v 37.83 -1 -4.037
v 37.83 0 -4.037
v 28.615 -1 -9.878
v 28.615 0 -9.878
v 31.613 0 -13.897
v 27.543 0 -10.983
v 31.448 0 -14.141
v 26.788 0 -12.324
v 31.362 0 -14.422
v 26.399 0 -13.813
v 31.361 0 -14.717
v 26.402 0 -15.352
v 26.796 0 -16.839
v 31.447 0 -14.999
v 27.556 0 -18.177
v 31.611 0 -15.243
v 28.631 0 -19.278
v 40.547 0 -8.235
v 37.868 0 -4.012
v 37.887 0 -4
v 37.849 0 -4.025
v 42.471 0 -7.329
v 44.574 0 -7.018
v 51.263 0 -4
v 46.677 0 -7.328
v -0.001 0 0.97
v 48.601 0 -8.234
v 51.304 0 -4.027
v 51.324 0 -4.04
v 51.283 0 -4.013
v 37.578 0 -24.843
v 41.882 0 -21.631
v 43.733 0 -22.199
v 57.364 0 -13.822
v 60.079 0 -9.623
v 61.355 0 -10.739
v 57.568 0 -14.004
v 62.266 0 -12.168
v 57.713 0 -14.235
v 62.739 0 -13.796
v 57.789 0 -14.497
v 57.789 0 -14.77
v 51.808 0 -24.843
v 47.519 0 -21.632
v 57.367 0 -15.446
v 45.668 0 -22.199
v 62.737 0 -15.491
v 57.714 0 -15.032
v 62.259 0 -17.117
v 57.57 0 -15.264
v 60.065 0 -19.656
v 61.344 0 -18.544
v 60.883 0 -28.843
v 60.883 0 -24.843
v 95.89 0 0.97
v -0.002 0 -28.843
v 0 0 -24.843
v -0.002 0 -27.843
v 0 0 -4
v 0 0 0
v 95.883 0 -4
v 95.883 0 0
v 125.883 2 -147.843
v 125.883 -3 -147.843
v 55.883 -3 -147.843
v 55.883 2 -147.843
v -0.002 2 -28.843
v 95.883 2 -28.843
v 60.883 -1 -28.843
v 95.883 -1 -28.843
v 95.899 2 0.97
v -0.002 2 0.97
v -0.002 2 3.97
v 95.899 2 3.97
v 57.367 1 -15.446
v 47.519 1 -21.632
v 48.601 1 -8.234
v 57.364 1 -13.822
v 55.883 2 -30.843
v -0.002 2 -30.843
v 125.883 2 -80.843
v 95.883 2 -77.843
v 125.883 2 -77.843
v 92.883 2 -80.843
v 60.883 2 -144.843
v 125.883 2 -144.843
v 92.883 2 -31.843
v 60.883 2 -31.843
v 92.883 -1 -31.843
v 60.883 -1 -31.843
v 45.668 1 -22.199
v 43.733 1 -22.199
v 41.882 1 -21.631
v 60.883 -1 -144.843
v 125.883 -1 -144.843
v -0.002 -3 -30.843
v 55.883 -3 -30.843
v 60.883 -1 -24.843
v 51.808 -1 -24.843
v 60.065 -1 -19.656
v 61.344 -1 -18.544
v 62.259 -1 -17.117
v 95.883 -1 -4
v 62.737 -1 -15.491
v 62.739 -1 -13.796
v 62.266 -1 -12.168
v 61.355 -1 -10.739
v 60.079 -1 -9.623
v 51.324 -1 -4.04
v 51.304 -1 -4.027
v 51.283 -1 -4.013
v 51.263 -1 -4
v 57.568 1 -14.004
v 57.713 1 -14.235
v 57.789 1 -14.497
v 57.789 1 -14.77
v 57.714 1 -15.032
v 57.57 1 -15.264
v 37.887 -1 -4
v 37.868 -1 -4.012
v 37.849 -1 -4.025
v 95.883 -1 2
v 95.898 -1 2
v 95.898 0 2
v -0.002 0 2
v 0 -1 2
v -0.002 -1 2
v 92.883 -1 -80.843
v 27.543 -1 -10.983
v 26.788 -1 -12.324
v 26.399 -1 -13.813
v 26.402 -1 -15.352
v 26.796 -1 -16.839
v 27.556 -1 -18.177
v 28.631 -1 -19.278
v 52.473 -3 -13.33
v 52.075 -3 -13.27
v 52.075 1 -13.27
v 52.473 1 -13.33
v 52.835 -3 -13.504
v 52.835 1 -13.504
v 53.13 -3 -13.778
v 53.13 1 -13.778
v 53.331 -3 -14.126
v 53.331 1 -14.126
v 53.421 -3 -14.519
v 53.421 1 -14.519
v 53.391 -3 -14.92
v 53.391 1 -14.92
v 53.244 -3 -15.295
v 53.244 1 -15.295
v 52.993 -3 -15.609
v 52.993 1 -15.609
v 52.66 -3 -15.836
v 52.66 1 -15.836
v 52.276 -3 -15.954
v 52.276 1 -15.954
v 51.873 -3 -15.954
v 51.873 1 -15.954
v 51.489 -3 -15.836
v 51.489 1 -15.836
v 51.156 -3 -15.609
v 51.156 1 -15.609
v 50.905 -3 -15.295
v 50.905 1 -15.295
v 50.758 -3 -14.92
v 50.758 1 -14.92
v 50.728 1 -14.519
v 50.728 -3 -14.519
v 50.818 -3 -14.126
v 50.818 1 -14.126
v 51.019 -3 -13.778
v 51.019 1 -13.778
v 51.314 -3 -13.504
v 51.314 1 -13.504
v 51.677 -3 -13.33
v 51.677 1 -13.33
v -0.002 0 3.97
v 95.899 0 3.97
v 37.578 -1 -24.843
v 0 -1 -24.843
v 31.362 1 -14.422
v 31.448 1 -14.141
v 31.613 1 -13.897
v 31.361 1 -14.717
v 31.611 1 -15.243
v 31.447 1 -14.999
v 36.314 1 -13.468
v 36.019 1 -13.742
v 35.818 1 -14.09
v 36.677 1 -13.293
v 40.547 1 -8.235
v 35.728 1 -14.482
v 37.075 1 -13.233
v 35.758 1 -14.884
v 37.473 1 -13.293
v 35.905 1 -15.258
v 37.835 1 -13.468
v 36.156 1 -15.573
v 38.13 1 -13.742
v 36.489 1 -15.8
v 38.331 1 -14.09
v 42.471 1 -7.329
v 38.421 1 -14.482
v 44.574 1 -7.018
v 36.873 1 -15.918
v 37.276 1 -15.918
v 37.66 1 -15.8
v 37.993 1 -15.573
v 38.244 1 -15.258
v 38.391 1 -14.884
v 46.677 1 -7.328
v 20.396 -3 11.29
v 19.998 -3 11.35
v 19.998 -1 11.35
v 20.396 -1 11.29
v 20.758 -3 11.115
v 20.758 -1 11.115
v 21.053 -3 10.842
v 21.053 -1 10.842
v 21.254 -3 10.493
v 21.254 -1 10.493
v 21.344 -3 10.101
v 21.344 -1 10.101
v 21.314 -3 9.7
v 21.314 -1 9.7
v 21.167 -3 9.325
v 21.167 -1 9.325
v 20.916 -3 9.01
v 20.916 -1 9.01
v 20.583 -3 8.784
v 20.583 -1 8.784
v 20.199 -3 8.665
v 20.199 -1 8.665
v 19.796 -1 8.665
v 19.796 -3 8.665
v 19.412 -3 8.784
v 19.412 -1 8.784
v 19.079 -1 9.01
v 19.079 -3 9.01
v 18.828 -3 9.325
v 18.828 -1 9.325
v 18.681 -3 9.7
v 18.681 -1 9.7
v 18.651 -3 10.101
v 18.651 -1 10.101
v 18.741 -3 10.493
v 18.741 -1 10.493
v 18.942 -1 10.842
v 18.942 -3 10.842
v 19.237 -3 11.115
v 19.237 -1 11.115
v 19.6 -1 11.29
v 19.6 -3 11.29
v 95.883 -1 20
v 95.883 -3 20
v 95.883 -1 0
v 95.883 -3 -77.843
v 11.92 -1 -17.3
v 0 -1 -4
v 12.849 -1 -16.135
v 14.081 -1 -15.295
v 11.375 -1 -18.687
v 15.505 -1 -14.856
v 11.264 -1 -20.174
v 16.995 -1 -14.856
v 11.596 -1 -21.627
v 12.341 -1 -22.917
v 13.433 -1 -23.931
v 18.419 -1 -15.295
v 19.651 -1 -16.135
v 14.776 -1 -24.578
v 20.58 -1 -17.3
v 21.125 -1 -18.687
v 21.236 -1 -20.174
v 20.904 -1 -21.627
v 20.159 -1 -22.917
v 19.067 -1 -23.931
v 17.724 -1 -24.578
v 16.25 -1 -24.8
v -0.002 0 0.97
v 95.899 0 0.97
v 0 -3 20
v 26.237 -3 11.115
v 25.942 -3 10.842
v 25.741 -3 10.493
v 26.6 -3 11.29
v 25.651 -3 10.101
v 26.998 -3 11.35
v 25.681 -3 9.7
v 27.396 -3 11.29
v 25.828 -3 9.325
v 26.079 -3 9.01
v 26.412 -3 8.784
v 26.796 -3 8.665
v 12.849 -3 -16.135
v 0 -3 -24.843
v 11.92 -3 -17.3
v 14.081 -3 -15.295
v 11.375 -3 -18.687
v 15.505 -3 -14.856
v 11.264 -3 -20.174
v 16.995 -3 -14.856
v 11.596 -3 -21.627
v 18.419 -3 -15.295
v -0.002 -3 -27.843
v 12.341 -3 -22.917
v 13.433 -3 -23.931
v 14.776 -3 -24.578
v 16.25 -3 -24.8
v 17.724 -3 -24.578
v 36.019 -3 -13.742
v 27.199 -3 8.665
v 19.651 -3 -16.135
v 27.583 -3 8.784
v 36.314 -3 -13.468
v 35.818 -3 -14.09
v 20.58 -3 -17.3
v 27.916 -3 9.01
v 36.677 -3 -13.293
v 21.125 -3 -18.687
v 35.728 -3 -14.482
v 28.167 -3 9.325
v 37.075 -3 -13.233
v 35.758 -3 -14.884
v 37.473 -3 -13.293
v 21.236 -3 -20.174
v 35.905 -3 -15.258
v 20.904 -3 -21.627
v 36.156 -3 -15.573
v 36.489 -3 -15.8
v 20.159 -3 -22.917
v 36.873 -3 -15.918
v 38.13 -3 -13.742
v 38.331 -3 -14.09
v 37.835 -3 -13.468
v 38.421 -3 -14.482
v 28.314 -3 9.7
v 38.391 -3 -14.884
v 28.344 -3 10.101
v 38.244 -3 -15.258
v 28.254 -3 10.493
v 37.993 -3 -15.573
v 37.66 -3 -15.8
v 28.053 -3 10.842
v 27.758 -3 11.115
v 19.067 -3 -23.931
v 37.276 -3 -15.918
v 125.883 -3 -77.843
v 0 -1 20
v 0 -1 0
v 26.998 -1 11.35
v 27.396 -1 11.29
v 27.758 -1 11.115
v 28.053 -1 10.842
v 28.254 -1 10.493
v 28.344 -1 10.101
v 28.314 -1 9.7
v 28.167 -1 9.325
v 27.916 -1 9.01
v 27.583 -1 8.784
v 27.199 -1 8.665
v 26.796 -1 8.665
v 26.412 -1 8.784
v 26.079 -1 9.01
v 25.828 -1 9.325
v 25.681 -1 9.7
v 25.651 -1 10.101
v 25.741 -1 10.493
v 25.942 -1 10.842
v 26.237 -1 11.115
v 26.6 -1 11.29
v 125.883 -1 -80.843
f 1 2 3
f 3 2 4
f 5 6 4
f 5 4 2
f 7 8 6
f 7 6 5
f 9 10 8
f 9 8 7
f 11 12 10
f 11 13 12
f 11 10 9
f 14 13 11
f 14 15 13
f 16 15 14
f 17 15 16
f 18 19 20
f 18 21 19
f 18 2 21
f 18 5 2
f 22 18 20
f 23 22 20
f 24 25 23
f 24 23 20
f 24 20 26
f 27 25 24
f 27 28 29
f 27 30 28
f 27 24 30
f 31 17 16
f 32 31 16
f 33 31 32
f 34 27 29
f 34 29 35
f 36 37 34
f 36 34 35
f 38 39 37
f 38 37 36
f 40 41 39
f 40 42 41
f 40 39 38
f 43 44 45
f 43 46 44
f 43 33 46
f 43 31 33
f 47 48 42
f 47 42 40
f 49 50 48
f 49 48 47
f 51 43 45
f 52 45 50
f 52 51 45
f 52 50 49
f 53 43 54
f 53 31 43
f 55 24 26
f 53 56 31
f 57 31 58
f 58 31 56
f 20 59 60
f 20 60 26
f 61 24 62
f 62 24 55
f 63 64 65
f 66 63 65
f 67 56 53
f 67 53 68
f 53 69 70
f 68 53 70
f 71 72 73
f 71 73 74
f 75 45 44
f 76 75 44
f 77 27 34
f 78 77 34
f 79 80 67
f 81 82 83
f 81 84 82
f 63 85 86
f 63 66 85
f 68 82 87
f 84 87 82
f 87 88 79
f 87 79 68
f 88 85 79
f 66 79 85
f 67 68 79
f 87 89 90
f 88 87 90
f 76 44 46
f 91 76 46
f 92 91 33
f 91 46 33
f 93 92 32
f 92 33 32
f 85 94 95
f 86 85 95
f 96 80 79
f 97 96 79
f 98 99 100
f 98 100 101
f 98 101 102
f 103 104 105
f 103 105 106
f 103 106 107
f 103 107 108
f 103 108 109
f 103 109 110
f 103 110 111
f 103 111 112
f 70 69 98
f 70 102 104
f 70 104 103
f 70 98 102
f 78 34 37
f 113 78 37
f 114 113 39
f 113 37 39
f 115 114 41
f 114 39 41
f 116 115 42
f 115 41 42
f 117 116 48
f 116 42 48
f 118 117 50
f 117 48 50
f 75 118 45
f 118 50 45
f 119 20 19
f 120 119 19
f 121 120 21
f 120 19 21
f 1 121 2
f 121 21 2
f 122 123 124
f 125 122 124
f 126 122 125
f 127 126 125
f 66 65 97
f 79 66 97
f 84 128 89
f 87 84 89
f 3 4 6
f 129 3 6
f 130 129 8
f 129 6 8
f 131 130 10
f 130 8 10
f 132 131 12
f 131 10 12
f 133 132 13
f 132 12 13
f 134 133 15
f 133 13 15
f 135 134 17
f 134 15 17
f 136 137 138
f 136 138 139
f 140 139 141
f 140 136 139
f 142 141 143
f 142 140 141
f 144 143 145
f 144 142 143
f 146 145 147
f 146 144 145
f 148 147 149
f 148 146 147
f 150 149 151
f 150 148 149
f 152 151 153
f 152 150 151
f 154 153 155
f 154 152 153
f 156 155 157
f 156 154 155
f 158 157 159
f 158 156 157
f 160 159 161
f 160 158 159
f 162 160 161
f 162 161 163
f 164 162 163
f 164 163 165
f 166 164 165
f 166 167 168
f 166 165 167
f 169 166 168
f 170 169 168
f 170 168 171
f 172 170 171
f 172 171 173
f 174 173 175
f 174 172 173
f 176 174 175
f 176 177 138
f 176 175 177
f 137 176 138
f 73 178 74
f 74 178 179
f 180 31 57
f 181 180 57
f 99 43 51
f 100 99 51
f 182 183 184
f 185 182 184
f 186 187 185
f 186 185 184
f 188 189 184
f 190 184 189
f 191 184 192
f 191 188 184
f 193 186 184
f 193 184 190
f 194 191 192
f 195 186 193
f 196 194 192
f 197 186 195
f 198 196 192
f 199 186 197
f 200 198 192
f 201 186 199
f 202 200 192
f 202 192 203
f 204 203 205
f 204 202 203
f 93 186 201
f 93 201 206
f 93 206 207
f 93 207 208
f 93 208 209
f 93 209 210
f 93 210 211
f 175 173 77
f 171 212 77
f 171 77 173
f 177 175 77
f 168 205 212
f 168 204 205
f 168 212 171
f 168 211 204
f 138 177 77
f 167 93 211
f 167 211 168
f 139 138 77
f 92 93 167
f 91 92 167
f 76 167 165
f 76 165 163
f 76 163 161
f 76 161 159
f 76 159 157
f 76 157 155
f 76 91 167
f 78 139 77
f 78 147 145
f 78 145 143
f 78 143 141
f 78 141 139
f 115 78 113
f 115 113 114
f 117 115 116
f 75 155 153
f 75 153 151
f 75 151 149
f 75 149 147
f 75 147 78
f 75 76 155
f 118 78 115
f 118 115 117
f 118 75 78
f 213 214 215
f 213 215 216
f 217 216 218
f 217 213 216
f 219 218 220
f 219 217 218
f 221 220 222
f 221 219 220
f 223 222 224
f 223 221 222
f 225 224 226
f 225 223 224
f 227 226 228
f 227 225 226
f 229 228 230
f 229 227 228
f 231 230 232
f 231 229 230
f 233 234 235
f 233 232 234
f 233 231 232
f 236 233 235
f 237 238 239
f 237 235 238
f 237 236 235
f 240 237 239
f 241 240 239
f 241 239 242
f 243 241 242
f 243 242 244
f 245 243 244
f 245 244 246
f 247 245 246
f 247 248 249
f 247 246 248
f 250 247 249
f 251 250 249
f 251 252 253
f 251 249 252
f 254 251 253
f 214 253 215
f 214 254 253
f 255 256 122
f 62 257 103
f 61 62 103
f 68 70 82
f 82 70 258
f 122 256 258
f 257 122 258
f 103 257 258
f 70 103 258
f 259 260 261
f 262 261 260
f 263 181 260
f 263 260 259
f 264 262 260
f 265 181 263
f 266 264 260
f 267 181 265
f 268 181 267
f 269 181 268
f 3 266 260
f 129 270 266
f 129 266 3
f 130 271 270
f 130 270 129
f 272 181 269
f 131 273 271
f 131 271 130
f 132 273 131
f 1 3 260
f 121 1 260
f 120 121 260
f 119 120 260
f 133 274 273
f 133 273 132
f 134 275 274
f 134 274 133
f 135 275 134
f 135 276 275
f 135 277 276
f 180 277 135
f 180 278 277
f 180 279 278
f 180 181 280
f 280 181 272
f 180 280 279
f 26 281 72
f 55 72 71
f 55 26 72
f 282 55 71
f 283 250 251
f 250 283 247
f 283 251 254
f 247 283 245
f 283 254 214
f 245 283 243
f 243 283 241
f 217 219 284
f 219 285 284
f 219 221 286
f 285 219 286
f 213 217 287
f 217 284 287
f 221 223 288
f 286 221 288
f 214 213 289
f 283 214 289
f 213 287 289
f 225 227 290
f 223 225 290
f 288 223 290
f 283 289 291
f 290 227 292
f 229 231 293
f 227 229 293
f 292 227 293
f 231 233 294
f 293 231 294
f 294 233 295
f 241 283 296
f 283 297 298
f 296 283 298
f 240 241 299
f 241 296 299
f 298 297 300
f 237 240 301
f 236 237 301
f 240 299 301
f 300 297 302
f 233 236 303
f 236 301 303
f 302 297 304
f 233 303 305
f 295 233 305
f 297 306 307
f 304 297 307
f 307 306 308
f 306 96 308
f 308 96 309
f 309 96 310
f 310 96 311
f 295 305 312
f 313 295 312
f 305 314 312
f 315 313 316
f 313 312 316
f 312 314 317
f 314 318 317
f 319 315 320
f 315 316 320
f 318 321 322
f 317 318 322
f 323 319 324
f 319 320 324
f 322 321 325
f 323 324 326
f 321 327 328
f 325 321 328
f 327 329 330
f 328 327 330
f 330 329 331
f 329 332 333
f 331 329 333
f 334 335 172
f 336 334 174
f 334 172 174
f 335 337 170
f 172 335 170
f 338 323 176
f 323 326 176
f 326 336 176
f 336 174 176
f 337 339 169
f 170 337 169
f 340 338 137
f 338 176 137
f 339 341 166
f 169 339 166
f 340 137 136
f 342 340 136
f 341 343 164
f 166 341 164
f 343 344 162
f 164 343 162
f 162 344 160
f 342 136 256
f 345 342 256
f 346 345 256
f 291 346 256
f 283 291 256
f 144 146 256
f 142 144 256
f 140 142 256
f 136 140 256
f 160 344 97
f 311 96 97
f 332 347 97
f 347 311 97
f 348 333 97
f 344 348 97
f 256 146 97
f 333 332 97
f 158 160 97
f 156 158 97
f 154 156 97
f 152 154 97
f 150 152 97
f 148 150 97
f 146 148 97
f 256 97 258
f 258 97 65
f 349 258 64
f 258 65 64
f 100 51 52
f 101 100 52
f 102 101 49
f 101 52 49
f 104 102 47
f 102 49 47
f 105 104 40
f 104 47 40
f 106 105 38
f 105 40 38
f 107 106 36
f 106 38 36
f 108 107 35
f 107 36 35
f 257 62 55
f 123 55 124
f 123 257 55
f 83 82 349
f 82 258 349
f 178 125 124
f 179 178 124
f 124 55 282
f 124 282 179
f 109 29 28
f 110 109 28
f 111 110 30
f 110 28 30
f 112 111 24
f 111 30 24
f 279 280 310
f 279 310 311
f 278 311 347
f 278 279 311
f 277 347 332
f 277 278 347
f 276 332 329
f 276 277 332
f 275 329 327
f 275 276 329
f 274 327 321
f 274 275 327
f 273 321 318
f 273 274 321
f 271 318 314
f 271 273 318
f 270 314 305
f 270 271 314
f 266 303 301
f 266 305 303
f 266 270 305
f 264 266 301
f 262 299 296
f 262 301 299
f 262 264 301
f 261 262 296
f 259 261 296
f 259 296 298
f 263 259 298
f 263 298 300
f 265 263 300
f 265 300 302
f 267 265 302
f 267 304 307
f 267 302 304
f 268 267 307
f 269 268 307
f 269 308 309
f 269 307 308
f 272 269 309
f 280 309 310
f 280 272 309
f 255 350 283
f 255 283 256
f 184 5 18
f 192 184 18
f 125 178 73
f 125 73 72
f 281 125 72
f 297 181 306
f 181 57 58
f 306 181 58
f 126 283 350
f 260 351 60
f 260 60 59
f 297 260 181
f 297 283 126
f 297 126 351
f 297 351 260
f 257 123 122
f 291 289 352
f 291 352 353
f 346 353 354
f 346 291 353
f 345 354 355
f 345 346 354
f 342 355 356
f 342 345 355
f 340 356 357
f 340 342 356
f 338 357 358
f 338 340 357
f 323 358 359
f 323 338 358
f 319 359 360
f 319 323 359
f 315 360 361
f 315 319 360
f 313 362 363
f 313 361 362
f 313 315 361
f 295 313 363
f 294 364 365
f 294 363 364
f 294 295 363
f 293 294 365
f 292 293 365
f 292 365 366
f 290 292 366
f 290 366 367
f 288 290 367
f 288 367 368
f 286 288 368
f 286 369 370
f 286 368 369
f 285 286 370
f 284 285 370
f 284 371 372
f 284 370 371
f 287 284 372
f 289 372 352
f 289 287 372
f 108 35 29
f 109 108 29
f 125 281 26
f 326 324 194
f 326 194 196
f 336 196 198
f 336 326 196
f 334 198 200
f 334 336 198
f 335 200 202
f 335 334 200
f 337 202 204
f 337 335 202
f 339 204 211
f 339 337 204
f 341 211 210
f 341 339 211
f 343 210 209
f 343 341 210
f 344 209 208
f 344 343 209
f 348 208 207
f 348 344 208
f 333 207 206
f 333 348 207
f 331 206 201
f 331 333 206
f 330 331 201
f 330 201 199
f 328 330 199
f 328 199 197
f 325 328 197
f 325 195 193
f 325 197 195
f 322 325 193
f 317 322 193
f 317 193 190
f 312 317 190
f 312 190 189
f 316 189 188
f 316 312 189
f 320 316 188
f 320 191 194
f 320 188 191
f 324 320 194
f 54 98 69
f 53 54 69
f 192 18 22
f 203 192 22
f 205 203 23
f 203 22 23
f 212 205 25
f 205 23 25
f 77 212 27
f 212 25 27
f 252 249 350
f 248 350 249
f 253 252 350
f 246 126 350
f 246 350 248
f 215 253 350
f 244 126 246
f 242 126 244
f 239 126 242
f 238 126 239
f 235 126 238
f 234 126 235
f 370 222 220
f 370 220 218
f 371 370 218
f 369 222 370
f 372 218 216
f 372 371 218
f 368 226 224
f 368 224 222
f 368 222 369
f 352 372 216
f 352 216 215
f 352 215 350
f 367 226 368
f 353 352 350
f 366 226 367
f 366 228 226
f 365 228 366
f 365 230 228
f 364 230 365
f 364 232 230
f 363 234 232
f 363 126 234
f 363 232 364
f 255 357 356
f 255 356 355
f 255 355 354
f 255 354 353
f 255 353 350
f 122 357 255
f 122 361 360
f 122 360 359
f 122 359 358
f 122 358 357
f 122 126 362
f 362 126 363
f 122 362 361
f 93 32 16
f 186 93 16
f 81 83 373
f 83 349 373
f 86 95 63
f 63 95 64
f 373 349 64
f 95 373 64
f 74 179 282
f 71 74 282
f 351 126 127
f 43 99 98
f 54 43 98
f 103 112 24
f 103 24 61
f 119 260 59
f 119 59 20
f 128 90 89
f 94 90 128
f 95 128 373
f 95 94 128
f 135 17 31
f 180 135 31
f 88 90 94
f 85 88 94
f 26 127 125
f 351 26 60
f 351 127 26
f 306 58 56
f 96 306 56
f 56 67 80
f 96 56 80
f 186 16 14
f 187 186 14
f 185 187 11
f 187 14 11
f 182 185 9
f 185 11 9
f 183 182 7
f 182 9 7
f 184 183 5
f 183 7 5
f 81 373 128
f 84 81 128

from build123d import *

# Parameters (mm, degrees)
EXTRUDE_1_DEPTH          = 1
EXTRUDE_2_DEPTH          = 1
SKETCH_5_W               = 95.882599
SKETCH_5_H               = 27.8428
EXTRUDE_3_DEPTH          = 2
CUT_EXTRUDE_1_DEPTH      = 100.923442209
CUT_EXTRUDE_1_DEPTH_BACK = 100.923442209
SKETCH_6_R               = 5
CUT_EXTRUDE_2_DEPTH      = 100.923442209
CUT_EXTRUDE_2_DEPTH_BACK = 100.923442209
SKETCH_7_R               = 1.35
SKETCH_8_W               = 95.882599
SKETCH_8_H               = 20
EXTRUDE_4_DEPTH          = 2
EXTRUDE_5_DEPTH          = 1
SKETCH_10_W              = 40
SKETCH_10_H              = 120
EXTRUDE_6_DEPTH          = 2
EXTRUDE_START            = -3
EXTRUDE_7_DEPTH          = 3
SKETCH_12_W              = 5
SKETCH_12_H              = 123
EXTRUDE_8_DEPTH          = 1
EXTRUDE_9_OUTLINE_W      = 95.901549254
EXTRUDE_9_OUTLINE_H      = 3
EXTRUDE_9_OUTLINE_W_2    = 95.885
EXTRUDE_9_OUTLINE_H_2    = 2
EXTRUDE_9_DEPTH          = 2
EXTRUDE_START_2          = -1
EXTRUDE_9_2_OUTLINE_W    = 95.885
EXTRUDE_9_2_OUTLINE_H    = 2
EXTRUDE_9_2_DEPTH        = 1
CUT_EXTRUDE_3_DEPTH      = 177.247383378
CUT_EXTRUDE_3_DEPTH_BACK = 177.247383378
SKETCH_16_R              = 1.35
SKETCH_17_W              = 30
SKETCH_17_H              = 70
EXTRUDE_10_DEPTH         = 2
EXTRUDE_11_DEPTH         = 3


# Read off the part's stored shape, not the designer's step: 凸台-拉伸9
with BuildPart() as part:
    # 草图3 → 凸台-拉伸1 (new body)
    with BuildSketch(Plane(origin=(0, 0, 0), x_dir=(1, 0, 0), z_dir=(0, 1, 0))):
        with BuildLine():
            Line((41.882488294, 21.631498957), (31.610829647, 15.243028334))
            ThreePointArc((31.610829647, 15.243028334), (31.350600602, 14.569512784), (31.613242469, 13.896934459))
            Line((31.613242469, 13.896934459), (40.546880152, 8.234769731))
            ThreePointArc((40.546880152, 8.234769731), (44.573930655, 7.017936995), (48.601204689, 8.234029718))
            Line((48.601204689, 8.234029718), (57.364385058, 13.822144736))
            ThreePointArc((57.364385058, 13.822144736), (57.798599734, 14.63340346), (57.366705056, 15.44589967))
            Line((57.366705056, 15.44589967), (47.51874726, 21.632437259))
            ThreePointArc((47.51874726, 21.632437259), (44.700511427, 22.270800367), (41.882488294, 21.631498957))
        make_face()
    extrude(amount=EXTRUDE_1_DEPTH)

    # 草图4 → 凸台-拉伸2 (add)
    with BuildSketch(Plane.XZ):
        with BuildLine():
            Line((49.96883361, -25.998027869), (60.064619869, -19.655803167))
            ThreePointArc((60.064619869, -19.655803167), (62.798594558, -14.643390815), (60.079038247, -9.623140954))
            Line((60.079038247, -9.623140954), (51.324268762, -4.040389399))
            ThreePointArc((51.324268762, -4.040389399), (44.577632655, -2.01793734), (37.829997654, -4.03705422))
            Line((37.829997654, -4.03705422), (28.614522584, -9.877848279))
            ThreePointArc((28.614522584, -9.877848279), (26.350608769, -14.582124379), (28.631489707, -19.27819737))
            Line((28.631489707, -19.27819737), (39.443234024, -26.002574933))
            ThreePointArc((39.443234024, -26.002574933), (44.706582673, -27.270799381), (49.96883361, -25.998027869))
        make_face()
    extrude(amount=EXTRUDE_2_DEPTH)

    # 草图5 → 凸台-拉伸3 (add)
    with BuildSketch(Plane.XZ.offset(1)):
        with Locations((47.9412995, -13.9214)):
            Rectangle(SKETCH_5_W, SKETCH_5_H)
    extrude(amount=EXTRUDE_3_DEPTH)

    # 草图6 → 切除-拉伸1 (cut, two sides: drawn at the far end of the back side and taken through both)
    with BuildSketch(Plane.XZ.offset(3).offset(-CUT_EXTRUDE_1_DEPTH_BACK)):
        with Locations(Location((16.25, -19.8, 0), (0, 0, 270))):
            Circle(SKETCH_6_R)
    extrude(amount=CUT_EXTRUDE_1_DEPTH + CUT_EXTRUDE_1_DEPTH_BACK, mode=Mode.SUBTRACT)

    # 草图7 → 切除-拉伸2 (cut, two sides: drawn at the far end of the back side and taken through both)
    with BuildSketch(Plane(origin=(0, 1, 0), x_dir=(1, 0, 0), z_dir=(0, 1, 0)).offset(-CUT_EXTRUDE_2_DEPTH_BACK)):
        with Locations(Location((37.074600168, 14.583340303, 0), (0, 0, 270))):
            Circle(SKETCH_7_R)
        with Locations(Location((52.074600168, 14.619575942, 0), (0, 0, 270))):
            Circle(SKETCH_7_R)
    extrude(amount=CUT_EXTRUDE_2_DEPTH + CUT_EXTRUDE_2_DEPTH_BACK, mode=Mode.SUBTRACT)

    # 草图8 → 凸台-拉伸4 (add)
    with BuildSketch(Plane(origin=(0, -1, 0), x_dir=(1, 0, 0), z_dir=(0, 1, 0))):
        with Locations((47.9412995, -10)):
            Rectangle(SKETCH_8_W, SKETCH_8_H)
    extrude(amount=-EXTRUDE_4_DEPTH)

    # 草图9 → 凸台-拉伸5 (add)
    with BuildSketch(Plane(origin=(0, -1, 0), x_dir=(1, 0, 0), z_dir=(0, 1, 0))):
        Polygon((0, 0), (0, 4), (95.882599, 4), (95.882599, 0), (95.898271126, -2), (-0.002401, -2), align=None)
    extrude(amount=EXTRUDE_5_DEPTH)

    # 草图10 → 凸台-拉伸6 (add)
    with BuildSketch(Plane(origin=(0, -1, 0), x_dir=(1, 0, 0), z_dir=(0, 1, 0))):
        with Locations((75.882599, 87.8428)):
            Rectangle(SKETCH_10_W, SKETCH_10_H)
    extrude(amount=-EXTRUDE_6_DEPTH)

    # 草图11 → 凸台-拉伸7 (add)
    with BuildSketch(Plane.XZ.offset(3).offset(EXTRUDE_START)):
        Polygon((-0.002401, -27.8428), (-0.002401, -30.8428), (55.882599, -30.8428), (55.882599, -27.8428), (55.882599, -24.8428), (0, -24.8428), align=None)
    extrude(amount=EXTRUDE_7_DEPTH)

    # 草图12 → 凸台-拉伸8 (add)
    with BuildSketch(Plane(origin=(0, -1, 0), x_dir=(1, 0, 0), z_dir=(0, 1, 0))):
        with Locations((58.382599, 86.3428)):
            Rectangle(SKETCH_12_W, SKETCH_12_H)
    extrude(amount=EXTRUDE_8_DEPTH)

    # 凸台-拉伸9 outline → 凸台-拉伸9 (add)
    with BuildSketch(Plane(origin=(0, 0, 0), x_dir=(1, 0, 0), z_dir=(0, 1, 0))):
        with Locations((47.948373627, -2.4702)):
            Rectangle(EXTRUDE_9_OUTLINE_W, EXTRUDE_9_OUTLINE_H)
        with Locations((47.940099, 29.8428)):
            Rectangle(EXTRUDE_9_OUTLINE_W_2, EXTRUDE_9_OUTLINE_H_2)
    extrude(amount=EXTRUDE_9_DEPTH)

    # Extrude 9 2 outline → Extrude 9 2 (add)
    with BuildSketch(Plane(origin=(0, 0, 0), x_dir=(1, 0, 0), z_dir=(0, 1, 0)).offset(EXTRUDE_START_2)):
        with Locations((47.940099, 29.8428)):
            Rectangle(EXTRUDE_9_2_OUTLINE_W, EXTRUDE_9_2_OUTLINE_H)
    extrude(amount=EXTRUDE_9_2_DEPTH)

    # 草图16 → 切除-拉伸3 (cut, two sides: drawn at the far end of the back side and taken through both)
    with BuildSketch(Plane(origin=(0, -1, 0), x_dir=(1, 0, 0), z_dir=(0, 1, 0)).offset(-CUT_EXTRUDE_3_DEPTH_BACK)):
        with Locations(Location((19.997599, -10, 0), (0, 0, 270))):
            Circle(SKETCH_16_R)
        with Locations(Location((26.997599, -10, 0), (0, 0, 270))):
            Circle(SKETCH_16_R)
    extrude(amount=CUT_EXTRUDE_3_DEPTH + CUT_EXTRUDE_3_DEPTH_BACK, mode=Mode.SUBTRACT)

    # 草图17 → 凸台-拉伸10 (add)
    with BuildSketch(Plane(origin=(0, -1, 0), x_dir=(1, 0, 0), z_dir=(0, 1, 0))):
        with Locations((110.882599, 112.8428)):
            Rectangle(SKETCH_17_W, SKETCH_17_H)
    extrude(amount=-EXTRUDE_10_DEPTH)

    # 草图18 → 凸台-拉伸11 (add)
    with BuildSketch(Plane(origin=(0, -1, 0), x_dir=(1, 0, 0), z_dir=(0, 1, 0))):
        Polygon((95.882599, 30.8428), (95.882599, 77.8428), (125.882599, 77.8428), (125.882599, 80.8428), (92.882599, 80.8428), (92.882599, 31.8428), (60.882599, 31.8428), (60.882599, 144.8428), (125.882599, 144.8428), (125.882599, 147.8428), (55.882599, 147.8428), (55.882599, 30.8428), (60.882599, 30.8428), align=None)
    extrude(amount=EXTRUDE_11_DEPTH)


solid = part.part
